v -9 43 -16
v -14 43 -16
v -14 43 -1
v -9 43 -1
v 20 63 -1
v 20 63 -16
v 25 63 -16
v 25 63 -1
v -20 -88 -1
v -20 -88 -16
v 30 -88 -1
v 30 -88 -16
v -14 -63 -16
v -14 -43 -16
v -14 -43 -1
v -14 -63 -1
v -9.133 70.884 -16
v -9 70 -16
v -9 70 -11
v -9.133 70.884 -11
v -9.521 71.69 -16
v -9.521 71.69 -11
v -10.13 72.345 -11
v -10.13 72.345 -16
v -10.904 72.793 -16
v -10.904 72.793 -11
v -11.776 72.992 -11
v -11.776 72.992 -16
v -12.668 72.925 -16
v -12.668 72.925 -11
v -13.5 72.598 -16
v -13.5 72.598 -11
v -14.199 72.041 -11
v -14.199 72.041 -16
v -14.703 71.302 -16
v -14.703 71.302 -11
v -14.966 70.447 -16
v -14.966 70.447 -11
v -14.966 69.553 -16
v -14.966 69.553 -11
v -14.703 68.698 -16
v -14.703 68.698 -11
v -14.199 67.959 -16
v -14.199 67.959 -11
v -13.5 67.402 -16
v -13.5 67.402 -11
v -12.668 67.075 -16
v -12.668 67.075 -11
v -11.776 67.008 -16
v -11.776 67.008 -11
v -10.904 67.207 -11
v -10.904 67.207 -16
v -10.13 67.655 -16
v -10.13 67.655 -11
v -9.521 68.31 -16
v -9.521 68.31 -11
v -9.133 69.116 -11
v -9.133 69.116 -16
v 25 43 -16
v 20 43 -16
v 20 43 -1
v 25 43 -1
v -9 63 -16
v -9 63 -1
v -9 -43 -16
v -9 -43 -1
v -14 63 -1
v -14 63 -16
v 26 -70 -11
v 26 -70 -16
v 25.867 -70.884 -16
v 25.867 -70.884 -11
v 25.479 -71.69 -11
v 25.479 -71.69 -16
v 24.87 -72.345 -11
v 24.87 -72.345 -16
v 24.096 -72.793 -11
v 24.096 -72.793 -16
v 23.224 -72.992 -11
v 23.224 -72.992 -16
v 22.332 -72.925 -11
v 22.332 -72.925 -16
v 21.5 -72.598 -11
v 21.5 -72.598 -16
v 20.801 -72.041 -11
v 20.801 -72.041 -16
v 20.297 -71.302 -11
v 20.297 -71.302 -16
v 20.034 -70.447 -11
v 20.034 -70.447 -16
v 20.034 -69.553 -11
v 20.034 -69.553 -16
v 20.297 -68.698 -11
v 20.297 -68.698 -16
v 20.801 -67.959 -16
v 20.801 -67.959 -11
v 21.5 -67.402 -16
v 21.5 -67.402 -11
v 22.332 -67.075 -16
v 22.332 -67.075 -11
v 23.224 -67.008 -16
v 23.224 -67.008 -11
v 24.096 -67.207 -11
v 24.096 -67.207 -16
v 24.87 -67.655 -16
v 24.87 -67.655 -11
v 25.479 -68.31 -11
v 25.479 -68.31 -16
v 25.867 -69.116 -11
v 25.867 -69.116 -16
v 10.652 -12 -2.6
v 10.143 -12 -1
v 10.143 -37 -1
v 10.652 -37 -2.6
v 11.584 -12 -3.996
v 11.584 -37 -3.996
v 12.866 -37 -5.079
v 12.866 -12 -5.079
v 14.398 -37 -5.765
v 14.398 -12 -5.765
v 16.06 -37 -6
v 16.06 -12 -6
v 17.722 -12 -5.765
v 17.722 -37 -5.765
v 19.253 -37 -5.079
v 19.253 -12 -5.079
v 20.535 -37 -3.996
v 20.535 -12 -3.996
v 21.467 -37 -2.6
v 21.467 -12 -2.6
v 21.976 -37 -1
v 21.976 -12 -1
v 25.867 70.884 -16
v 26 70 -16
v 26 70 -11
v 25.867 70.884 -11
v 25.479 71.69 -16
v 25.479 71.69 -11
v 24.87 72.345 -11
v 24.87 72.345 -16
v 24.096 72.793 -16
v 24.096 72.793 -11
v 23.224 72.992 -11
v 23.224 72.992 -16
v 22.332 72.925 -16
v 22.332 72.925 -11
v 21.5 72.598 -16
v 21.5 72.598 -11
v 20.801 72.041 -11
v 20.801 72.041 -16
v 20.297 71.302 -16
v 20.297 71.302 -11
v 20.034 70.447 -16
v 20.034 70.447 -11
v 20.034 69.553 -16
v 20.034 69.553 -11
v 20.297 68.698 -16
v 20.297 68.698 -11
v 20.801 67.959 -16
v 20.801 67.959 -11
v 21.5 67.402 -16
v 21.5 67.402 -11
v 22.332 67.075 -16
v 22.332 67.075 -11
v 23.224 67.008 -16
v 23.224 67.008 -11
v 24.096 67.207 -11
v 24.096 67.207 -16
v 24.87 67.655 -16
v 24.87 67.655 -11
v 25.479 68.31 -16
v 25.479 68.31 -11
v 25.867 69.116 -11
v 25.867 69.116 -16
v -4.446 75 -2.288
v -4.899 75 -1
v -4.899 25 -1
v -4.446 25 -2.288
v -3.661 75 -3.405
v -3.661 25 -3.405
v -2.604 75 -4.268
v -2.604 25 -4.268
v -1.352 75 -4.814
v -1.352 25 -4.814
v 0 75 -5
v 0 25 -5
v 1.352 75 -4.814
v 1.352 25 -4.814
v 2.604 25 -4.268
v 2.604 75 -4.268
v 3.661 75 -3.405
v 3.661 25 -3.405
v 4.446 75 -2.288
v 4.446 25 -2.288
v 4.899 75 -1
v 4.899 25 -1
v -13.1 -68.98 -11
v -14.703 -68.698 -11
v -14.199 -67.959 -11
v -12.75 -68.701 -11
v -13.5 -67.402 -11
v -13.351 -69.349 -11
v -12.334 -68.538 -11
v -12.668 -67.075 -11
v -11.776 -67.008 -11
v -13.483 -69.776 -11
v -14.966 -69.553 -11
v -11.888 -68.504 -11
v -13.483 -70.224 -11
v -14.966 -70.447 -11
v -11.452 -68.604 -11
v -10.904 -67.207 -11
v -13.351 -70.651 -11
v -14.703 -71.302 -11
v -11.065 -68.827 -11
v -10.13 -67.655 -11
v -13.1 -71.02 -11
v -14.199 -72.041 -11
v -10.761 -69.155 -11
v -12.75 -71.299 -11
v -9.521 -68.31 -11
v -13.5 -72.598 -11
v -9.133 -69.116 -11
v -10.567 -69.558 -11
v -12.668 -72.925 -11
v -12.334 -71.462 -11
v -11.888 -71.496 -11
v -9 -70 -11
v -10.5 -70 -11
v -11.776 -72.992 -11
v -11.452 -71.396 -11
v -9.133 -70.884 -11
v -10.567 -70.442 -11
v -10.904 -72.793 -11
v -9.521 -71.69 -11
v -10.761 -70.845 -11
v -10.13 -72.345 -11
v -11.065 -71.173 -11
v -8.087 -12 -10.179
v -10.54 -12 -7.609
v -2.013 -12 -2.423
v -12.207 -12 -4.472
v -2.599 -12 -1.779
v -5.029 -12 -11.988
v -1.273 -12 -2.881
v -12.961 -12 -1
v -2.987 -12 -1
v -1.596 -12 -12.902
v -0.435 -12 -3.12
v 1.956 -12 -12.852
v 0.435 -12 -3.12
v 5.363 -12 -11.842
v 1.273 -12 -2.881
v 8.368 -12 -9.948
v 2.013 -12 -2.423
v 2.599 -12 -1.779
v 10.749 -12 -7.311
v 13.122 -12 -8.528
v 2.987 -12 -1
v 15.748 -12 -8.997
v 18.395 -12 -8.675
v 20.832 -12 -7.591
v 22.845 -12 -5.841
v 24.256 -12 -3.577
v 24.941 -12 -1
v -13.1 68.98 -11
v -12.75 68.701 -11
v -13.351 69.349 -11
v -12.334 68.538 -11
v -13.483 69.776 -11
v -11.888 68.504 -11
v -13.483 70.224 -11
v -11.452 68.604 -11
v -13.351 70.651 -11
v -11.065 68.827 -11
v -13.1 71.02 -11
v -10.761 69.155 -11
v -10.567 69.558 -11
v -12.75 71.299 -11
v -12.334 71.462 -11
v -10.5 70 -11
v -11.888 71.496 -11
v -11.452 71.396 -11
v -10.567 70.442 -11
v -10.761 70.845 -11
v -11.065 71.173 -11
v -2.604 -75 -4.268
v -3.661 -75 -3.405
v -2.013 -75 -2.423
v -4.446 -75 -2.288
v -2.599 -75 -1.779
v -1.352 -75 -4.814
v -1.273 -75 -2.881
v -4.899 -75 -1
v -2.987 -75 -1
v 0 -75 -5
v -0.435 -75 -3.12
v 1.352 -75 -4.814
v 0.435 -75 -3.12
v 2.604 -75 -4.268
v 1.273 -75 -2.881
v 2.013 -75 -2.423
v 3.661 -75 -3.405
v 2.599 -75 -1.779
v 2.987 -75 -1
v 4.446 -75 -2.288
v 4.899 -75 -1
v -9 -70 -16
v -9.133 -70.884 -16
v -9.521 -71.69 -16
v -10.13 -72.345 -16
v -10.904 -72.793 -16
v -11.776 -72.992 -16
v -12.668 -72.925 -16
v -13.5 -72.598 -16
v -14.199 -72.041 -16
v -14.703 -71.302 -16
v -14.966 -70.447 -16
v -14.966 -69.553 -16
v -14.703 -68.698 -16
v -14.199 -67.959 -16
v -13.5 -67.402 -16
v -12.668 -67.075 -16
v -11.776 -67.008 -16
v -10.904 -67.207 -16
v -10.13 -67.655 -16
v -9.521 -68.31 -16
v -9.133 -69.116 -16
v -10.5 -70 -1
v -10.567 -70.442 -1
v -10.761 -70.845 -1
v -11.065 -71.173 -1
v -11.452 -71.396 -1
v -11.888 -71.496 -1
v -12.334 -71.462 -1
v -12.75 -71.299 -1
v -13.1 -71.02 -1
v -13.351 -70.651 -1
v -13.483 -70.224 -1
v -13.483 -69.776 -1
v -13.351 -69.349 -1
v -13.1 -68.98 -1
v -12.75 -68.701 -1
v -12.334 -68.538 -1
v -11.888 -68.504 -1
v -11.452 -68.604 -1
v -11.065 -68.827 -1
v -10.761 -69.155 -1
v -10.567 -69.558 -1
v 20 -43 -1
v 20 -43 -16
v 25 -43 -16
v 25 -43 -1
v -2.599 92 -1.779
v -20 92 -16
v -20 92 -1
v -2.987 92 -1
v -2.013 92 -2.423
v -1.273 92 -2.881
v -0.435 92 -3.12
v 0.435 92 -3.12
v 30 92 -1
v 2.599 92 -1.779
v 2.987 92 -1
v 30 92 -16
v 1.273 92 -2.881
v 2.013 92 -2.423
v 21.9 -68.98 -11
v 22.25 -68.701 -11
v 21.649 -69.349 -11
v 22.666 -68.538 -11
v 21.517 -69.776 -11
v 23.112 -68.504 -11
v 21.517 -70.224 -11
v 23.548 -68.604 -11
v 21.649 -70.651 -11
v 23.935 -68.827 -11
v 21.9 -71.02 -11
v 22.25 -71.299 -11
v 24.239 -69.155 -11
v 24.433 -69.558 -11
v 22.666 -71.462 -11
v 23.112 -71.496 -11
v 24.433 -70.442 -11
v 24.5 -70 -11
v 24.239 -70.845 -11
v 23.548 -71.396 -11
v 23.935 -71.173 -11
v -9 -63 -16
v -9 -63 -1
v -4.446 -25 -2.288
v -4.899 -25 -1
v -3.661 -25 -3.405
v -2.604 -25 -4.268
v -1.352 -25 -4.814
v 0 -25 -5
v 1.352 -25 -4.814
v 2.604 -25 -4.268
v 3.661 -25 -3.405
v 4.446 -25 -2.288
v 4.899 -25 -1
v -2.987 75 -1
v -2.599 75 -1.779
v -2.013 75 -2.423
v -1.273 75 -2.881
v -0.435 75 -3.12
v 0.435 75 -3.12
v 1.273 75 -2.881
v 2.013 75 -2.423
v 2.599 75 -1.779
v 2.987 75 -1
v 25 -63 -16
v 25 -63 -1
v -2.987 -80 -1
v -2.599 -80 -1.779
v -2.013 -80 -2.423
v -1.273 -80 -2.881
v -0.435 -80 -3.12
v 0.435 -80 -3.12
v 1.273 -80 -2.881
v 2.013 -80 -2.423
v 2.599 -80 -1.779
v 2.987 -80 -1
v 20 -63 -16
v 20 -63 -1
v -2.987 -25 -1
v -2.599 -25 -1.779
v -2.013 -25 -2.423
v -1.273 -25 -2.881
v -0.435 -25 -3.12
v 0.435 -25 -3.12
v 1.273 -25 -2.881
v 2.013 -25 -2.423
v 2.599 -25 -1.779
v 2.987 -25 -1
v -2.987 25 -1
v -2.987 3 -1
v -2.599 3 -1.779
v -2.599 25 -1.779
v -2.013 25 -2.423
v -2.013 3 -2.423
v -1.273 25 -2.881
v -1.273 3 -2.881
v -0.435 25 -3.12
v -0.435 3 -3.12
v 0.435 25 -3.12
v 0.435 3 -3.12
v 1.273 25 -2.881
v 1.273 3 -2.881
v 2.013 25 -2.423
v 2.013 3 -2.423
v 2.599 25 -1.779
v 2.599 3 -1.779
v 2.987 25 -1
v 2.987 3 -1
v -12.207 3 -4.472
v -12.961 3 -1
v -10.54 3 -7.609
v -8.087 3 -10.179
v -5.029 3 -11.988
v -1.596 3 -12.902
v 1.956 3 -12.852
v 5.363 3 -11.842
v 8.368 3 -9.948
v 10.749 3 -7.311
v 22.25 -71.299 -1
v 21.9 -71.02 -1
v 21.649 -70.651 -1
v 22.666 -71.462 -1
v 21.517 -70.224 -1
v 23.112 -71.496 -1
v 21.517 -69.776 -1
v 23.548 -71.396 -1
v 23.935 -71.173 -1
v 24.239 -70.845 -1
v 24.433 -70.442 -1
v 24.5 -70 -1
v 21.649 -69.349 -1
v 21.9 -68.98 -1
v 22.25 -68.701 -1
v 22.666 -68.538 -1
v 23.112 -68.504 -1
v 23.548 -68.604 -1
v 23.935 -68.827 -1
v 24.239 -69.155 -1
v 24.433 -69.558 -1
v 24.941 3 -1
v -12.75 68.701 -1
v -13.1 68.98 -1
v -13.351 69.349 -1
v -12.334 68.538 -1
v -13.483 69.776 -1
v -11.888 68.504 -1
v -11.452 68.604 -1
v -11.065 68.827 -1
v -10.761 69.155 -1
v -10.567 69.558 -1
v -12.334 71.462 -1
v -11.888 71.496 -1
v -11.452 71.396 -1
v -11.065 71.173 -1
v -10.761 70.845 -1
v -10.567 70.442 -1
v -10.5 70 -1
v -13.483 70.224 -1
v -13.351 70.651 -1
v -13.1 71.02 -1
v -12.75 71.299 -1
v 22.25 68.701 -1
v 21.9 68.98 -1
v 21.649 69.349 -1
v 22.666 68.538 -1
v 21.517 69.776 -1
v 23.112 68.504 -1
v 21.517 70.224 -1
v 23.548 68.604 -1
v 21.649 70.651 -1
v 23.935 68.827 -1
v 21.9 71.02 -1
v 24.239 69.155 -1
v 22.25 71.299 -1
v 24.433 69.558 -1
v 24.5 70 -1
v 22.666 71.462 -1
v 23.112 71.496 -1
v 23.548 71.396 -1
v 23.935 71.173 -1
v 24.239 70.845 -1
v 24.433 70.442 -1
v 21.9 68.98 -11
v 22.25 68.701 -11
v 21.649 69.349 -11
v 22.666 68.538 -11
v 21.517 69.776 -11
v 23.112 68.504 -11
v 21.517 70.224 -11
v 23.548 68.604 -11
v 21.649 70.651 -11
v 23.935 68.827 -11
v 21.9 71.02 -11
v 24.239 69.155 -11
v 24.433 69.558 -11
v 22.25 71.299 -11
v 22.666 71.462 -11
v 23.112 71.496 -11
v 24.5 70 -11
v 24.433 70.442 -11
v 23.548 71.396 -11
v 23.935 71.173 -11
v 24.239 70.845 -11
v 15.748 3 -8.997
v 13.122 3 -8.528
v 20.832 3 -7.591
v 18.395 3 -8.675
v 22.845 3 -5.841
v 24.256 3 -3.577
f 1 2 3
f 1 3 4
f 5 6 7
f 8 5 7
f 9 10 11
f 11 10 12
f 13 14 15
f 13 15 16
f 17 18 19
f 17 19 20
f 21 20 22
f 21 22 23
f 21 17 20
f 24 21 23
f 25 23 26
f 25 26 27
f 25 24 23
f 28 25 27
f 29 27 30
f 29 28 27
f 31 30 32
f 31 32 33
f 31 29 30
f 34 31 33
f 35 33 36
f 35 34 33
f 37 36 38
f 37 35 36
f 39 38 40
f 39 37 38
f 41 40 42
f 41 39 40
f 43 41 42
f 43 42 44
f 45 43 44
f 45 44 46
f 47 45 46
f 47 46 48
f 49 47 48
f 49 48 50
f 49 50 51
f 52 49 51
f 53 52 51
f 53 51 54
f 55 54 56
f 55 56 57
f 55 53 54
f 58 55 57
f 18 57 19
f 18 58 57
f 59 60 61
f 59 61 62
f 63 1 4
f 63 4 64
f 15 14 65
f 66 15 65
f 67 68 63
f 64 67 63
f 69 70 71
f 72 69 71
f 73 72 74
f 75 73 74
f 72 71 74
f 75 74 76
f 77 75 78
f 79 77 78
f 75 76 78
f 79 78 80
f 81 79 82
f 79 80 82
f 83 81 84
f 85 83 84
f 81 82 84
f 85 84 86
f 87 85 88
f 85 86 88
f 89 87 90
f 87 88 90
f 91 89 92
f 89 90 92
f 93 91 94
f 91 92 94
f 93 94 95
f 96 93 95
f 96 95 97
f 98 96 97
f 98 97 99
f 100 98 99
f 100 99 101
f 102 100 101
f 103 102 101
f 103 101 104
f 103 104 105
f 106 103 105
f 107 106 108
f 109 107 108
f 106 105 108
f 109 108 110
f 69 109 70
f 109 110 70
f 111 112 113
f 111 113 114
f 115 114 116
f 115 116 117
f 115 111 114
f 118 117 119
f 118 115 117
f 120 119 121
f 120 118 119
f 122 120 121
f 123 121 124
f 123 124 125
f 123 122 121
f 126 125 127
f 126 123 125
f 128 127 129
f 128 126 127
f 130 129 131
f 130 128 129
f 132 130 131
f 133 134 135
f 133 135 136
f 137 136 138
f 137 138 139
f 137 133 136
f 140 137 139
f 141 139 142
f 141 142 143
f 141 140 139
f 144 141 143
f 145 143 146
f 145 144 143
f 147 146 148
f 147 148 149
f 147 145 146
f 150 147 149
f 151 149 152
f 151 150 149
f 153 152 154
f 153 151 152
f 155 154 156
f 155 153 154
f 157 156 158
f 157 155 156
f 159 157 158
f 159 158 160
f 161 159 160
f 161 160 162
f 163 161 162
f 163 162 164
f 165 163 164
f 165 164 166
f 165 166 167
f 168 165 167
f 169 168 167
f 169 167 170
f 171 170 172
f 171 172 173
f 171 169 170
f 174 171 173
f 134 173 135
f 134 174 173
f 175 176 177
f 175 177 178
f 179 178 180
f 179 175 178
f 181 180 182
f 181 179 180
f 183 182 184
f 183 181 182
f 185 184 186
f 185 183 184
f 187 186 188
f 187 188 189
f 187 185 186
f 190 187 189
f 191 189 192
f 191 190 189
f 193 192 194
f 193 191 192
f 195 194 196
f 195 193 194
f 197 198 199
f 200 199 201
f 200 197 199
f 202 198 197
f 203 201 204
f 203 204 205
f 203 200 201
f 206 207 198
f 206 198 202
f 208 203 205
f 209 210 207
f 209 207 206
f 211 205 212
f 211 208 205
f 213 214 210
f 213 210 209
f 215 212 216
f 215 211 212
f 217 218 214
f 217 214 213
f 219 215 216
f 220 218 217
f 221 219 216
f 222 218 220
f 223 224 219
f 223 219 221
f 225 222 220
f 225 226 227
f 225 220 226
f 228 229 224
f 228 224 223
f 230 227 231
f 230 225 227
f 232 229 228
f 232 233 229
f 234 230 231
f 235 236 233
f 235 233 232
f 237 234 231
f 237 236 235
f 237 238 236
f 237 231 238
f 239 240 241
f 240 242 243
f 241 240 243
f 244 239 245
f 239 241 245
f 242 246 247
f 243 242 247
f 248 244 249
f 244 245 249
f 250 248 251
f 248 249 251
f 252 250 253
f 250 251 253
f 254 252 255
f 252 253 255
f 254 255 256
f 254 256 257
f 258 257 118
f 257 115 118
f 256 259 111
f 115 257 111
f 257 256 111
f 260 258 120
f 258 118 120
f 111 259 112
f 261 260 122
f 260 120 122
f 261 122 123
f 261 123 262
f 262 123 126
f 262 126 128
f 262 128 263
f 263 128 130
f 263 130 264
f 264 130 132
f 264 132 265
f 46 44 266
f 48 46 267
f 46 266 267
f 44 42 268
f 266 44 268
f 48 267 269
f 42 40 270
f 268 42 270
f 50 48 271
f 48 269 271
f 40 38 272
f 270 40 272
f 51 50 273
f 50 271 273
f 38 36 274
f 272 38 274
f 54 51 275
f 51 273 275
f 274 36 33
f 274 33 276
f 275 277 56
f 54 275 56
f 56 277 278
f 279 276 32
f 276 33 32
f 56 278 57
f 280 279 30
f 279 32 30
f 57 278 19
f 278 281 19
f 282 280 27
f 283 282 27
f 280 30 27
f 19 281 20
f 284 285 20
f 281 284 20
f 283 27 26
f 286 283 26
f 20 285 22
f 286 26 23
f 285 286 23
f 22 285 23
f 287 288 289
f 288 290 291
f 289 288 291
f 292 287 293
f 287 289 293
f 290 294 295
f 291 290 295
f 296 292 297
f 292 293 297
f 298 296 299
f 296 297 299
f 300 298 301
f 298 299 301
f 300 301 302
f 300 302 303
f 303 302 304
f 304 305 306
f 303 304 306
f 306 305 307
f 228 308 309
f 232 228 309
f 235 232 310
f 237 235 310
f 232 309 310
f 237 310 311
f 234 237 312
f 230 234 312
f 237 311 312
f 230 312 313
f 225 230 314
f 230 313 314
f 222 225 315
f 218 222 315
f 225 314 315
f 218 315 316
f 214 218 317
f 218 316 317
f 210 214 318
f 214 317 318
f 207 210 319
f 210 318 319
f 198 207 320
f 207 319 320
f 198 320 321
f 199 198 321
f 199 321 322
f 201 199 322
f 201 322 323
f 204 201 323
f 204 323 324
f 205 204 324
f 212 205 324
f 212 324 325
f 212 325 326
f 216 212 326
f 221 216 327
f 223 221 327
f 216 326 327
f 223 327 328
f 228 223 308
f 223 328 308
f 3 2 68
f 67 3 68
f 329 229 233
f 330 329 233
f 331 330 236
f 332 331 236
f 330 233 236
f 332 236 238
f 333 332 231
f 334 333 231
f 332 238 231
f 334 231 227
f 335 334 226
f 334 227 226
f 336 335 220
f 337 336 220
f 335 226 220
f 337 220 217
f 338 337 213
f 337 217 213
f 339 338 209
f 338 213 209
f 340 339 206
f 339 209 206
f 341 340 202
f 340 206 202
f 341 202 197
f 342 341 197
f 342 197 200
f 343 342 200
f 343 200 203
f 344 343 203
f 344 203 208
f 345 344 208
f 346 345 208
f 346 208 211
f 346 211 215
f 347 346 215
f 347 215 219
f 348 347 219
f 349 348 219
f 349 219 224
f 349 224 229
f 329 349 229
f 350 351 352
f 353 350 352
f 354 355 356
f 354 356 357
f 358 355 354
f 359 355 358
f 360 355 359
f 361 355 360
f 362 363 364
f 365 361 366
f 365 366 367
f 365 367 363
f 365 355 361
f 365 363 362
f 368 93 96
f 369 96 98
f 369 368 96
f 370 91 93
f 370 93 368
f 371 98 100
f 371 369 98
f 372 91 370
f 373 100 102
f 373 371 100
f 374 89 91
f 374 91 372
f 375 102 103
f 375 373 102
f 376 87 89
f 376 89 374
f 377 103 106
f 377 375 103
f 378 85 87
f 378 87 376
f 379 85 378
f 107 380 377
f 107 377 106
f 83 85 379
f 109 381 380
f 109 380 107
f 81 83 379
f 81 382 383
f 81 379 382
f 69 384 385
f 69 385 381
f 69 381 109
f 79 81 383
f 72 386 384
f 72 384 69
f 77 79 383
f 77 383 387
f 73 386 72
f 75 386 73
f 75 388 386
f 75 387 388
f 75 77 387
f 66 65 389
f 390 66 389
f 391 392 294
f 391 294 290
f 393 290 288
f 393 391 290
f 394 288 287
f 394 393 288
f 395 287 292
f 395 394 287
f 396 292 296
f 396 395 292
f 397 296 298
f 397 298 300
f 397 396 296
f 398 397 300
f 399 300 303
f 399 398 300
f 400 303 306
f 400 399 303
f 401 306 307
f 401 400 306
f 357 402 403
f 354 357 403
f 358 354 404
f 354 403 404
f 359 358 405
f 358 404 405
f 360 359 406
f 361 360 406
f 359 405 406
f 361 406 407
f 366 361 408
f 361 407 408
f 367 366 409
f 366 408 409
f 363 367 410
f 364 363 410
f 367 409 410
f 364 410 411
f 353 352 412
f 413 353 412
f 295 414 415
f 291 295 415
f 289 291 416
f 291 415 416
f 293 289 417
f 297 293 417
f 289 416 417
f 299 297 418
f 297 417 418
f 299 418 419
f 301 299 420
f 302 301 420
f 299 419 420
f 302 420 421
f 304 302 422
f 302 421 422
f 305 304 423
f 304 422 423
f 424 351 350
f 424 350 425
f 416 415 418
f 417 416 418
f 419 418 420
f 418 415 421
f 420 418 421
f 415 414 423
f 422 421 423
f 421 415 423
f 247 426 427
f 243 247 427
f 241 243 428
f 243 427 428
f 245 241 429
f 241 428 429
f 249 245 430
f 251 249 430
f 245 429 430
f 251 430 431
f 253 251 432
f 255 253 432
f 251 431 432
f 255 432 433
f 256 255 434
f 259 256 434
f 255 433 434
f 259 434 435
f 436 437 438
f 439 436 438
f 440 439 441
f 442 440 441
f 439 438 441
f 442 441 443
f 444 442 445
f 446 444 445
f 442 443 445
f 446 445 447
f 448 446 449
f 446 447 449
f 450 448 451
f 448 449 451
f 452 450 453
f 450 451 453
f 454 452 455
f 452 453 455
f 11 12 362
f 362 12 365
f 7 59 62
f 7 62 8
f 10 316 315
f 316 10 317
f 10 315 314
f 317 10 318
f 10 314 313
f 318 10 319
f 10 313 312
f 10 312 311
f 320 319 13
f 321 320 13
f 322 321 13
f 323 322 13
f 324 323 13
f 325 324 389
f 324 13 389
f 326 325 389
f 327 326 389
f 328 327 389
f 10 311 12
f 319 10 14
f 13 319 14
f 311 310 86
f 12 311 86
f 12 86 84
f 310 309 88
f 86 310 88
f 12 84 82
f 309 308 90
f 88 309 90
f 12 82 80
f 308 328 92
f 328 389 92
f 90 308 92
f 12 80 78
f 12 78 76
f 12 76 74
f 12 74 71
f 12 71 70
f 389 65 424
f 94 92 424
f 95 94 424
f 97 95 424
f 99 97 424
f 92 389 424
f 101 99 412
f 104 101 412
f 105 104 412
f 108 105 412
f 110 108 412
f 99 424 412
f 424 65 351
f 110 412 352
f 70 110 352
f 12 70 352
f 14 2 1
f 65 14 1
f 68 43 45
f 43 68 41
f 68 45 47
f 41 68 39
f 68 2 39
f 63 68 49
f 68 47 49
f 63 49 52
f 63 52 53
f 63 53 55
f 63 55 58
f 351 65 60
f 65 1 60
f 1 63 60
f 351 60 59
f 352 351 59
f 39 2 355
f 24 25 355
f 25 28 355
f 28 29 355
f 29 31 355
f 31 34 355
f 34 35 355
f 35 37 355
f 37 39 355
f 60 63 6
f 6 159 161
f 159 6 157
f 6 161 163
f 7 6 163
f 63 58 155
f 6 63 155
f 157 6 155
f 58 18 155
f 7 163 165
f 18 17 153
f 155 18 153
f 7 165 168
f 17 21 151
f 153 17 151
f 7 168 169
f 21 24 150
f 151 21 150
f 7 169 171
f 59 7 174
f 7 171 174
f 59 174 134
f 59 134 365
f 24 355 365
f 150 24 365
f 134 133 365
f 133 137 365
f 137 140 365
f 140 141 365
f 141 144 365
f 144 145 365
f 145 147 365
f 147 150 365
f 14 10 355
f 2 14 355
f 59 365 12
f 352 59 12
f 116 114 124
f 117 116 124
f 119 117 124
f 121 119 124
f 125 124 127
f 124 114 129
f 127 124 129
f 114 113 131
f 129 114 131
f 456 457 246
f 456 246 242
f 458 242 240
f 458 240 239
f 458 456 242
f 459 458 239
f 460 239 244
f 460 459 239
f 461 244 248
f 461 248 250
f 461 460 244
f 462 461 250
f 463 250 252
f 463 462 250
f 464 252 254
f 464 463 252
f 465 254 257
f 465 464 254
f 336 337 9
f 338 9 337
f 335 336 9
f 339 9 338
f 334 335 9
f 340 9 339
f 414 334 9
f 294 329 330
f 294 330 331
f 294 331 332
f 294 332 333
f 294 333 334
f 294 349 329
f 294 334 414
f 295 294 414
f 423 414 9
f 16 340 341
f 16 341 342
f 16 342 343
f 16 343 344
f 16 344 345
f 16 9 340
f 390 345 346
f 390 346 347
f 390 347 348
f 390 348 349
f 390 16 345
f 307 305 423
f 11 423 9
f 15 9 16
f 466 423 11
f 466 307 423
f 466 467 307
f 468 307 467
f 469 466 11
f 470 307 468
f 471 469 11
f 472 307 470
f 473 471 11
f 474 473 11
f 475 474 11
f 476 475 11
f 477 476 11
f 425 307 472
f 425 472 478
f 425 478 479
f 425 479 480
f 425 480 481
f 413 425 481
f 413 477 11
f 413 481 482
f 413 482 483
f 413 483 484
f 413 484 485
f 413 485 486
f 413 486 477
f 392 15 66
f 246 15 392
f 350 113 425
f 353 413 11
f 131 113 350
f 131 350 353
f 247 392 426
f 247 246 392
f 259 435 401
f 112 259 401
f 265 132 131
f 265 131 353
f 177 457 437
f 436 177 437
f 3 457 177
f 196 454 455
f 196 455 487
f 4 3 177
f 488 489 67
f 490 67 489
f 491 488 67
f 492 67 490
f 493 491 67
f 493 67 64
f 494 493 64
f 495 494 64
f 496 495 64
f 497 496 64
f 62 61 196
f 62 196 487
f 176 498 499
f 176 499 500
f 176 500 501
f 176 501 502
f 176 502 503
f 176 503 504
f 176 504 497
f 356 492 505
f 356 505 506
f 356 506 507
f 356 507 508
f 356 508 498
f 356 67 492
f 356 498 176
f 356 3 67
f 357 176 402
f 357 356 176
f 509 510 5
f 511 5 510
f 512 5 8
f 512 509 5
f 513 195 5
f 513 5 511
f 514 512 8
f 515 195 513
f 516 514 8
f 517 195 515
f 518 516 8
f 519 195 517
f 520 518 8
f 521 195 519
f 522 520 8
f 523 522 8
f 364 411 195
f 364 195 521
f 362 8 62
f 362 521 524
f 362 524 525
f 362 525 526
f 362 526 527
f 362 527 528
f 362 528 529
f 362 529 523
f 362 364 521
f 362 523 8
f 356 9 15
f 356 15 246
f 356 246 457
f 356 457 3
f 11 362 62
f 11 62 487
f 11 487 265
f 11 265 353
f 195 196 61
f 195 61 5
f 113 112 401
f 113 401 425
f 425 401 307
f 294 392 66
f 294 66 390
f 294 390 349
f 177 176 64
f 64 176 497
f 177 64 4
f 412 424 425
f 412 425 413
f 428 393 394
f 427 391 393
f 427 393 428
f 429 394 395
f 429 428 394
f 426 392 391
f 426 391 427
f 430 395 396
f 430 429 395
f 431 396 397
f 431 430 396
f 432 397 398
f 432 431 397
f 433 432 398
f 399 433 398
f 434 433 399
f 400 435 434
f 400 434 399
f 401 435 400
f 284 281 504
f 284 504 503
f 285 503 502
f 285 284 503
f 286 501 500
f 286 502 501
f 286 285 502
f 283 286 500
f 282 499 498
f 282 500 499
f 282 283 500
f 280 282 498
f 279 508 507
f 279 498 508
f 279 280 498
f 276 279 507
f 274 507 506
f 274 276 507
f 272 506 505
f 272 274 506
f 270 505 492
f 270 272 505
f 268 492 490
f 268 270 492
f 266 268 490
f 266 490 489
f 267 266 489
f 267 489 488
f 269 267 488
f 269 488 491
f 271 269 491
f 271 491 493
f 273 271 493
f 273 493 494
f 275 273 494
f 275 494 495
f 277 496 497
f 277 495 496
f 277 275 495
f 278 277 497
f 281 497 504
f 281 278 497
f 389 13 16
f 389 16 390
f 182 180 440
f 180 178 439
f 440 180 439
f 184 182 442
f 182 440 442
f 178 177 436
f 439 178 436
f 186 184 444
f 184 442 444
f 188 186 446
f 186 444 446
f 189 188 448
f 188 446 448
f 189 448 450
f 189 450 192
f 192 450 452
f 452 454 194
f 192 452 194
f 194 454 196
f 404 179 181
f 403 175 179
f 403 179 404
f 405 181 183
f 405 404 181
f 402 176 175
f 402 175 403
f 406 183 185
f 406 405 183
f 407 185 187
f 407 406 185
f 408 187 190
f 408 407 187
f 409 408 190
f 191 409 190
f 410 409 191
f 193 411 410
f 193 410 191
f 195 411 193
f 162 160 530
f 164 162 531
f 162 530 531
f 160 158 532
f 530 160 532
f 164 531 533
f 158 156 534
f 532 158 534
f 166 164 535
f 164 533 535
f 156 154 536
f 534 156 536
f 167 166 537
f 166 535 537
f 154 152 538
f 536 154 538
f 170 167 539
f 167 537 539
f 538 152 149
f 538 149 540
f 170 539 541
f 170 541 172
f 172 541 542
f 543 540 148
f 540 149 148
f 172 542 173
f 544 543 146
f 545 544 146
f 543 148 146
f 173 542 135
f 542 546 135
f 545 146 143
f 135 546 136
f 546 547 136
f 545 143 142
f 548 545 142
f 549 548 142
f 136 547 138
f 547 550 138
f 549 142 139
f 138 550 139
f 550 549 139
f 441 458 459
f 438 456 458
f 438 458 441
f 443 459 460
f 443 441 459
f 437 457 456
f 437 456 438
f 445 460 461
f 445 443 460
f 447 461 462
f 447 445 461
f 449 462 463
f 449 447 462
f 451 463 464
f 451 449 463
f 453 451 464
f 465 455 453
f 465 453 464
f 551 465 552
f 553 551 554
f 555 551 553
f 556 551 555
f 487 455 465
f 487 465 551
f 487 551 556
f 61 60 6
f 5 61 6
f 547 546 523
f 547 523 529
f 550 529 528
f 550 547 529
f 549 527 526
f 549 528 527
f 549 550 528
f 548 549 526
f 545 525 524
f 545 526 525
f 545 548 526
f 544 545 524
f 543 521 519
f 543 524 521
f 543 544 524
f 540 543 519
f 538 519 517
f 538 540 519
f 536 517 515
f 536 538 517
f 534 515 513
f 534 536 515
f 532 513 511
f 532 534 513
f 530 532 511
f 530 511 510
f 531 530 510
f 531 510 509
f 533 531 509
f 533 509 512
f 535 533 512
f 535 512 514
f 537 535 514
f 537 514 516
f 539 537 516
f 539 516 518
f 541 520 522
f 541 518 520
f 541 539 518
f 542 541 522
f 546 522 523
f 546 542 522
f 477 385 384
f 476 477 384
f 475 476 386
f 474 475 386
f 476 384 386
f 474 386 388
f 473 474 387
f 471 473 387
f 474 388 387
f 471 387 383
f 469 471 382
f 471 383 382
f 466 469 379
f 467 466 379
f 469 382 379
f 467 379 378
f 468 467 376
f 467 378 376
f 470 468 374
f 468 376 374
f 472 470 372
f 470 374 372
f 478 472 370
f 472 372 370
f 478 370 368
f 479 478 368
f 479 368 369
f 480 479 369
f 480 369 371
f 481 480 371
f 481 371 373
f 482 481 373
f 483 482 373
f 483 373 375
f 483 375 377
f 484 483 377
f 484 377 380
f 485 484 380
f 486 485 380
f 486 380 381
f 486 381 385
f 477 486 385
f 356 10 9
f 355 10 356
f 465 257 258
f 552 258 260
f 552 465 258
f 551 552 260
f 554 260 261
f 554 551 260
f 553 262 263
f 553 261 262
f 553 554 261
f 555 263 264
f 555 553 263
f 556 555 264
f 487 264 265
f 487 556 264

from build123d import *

# Parameters (mm, degrees)
SKETCH006_R     = 3.15
PAD002_DEPTH    = 190
SKETCH011_R     = 5
PAD007_DEPTH    = 50
SKETCH010_R     = 5
PAD006_DEPTH    = 50
SKETCH008_R     = 13
PAD004_DEPTH    = 15
SKETCH009_R     = 9
PAD005_DEPTH    = 15
SKETCH013_R     = 6
PAD008_DEPTH    = 26
BOX001_W        = 50
BOX001_H        = 180
BOX001_DEPTH    = 15
SKETCH015_R     = 1.5
POCKET001_DEPTH = 389.834296
SKETCH016_R     = 1.5
POCKET002_DEPTH = 389.834296
SKETCH017_R     = 3
POCKET003_DEPTH = 5
SKETCH018_R     = 3
POCKET004_DEPTH = 5
SKETCH022_W     = 5
SKETCH022_H     = 20
POCKET008_DEPTH = 389.834296
SKETCH023_W     = 5
SKETCH023_H     = 20
POCKET009_DEPTH = 389.834296


with BuildPart() as pad002:
    # Sketch006 → Pad002 (new body)
    with BuildSketch(Plane.XZ.offset(80)):
        Circle(SKETCH006_R)
    extrude(amount=-PAD002_DEPTH)


with BuildPart() as pad007:
    # Sketch011 → Pad007 (new body)
    with BuildSketch(Plane.XZ.offset(-75)):
        Circle(SKETCH011_R)
    extrude(amount=PAD007_DEPTH)


with BuildPart() as scassi_perno:
    # Sketch010 → Pad006 (new body)
    with BuildSketch(Plane.XZ.offset(25)):
        Circle(SKETCH010_R)
    extrude(amount=PAD006_DEPTH)

    # Fusion002: union Pad007
    add(pad007.part)


with BuildPart() as scasso_ruota_dentata:
    # Sketch008 → Pad004 (new body)
    with BuildSketch(Plane.XZ.offset(-3)):
        Circle(SKETCH008_R)
    extrude(amount=PAD004_DEPTH)


with BuildPart() as scassi_ruote_dentate:
    # Sketch009 → Pad005 (new body)
    with BuildSketch(Plane.XZ.offset(-3)):
        with Locations((15.997087, 9e-06)):
            Circle(SKETCH009_R)
    extrude(amount=PAD005_DEPTH)

    # Fusion001: union scasso_ruota_dentata
    add(scasso_ruota_dentata.part)


with BuildPart() as fusion:
    # Sketch013 → Pad008 (new body)
    with BuildSketch(Plane.XZ.offset(11)):
        with Locations((16.059561, 9e-06)):
            Circle(SKETCH013_R)
    extrude(amount=PAD008_DEPTH)

    # Fusion005: union scassi_perno, scassi_ruote_dentate
    add(scassi_perno.part)
    add(scassi_ruote_dentate.part)

    # Fusion: union Pad002
    add(pad002.part)


with BuildPart() as tappo_con_4_scassi:
    # Box001 → Box001 (new body)
    with BuildSketch(Plane(origin=(-20, -88, -16), x_dir=(1, 0, 0), z_dir=(0, 0, 1))):
        with Locations((25, 90)):
            Rectangle(BOX001_W, BOX001_H)
    extrude(amount=BOX001_DEPTH)

    # Cut001: cut Fusion
    add(fusion.part, mode=Mode.SUBTRACT)

    # Sketch015 → Pocket001 (cut, through all)
    with BuildSketch(Plane(origin=(0, 0, -16), x_dir=(1, 0, 0), z_dir=(0, 0, -1))):
        with Locations((23, 70)):
            Circle(SKETCH015_R)
    pocket001 = extrude(amount=-POCKET001_DEPTH, mode=Mode.SUBTRACT)

    # Mirrored: Pocket001 across Sketch015 H_Axis
    add(pocket001.mirror(Plane(origin=(0, 0, -16), x_dir=(0, 0, -1), z_dir=(0, -1, 0))), mode=Mode.SUBTRACT)

    # Sketch016 → Pocket002 (cut, through all)
    with BuildSketch(Plane(origin=(0, 0, -16), x_dir=(1, 0, 0), z_dir=(0, 0, -1))):
        with Locations((-12, 70)):
            Circle(SKETCH016_R)
    pocket002 = extrude(amount=-POCKET002_DEPTH, mode=Mode.SUBTRACT)

    # Mirrored001: Pocket002 across Sketch016 H_Axis
    add(pocket002.mirror(Plane(origin=(0, 0, -16), x_dir=(0, 0, -1), z_dir=(0, -1, 0))), mode=Mode.SUBTRACT)

    # Sketch017 → Pocket003 (cut)
    with BuildSketch(Plane(origin=(0, 0, -16), x_dir=(1, 0, 0), z_dir=(0, 0, -1))):
        with Locations((23, 70)):
            Circle(SKETCH017_R)
    pocket003 = extrude(amount=-POCKET003_DEPTH, mode=Mode.SUBTRACT)

    # Mirrored002: Pocket003 across Sketch017 H_Axis
    add(pocket003.mirror(Plane(origin=(0, 0, -16), x_dir=(0, 0, -1), z_dir=(0, -1, 0))), mode=Mode.SUBTRACT)

    # Sketch018 → Pocket004 (cut)
    with BuildSketch(Plane(origin=(0, 0, -16), x_dir=(1, 0, 0), z_dir=(0, 0, -1))):
        with Locations((-12, 70)):
            Circle(SKETCH018_R)
    pocket004 = extrude(amount=-POCKET004_DEPTH, mode=Mode.SUBTRACT)

    # Mirrored003: Pocket004 across Sketch018 H_Axis
    add(pocket004.mirror(Plane(origin=(0, 0, -16), x_dir=(0, 0, -1), z_dir=(0, -1, 0))), mode=Mode.SUBTRACT)

    # Sketch022 → Pocket008 (cut, through all)
    with BuildSketch(Plane(origin=(0, 0, -16), x_dir=(1, 0, 0), z_dir=(0, 0, -1))):
        with Locations((22.5, 53)):
            Rectangle(SKETCH022_W, SKETCH022_H)
    pocket008 = extrude(amount=-POCKET008_DEPTH, mode=Mode.SUBTRACT)

    # Mirrored006: Pocket008 across Sketch022 H_Axis
    add(pocket008.mirror(Plane(origin=(0, 0, -16), x_dir=(0, 0, -1), z_dir=(0, -1, 0))), mode=Mode.SUBTRACT)

    # Sketch023 → Pocket009 (cut, through all)
    with BuildSketch(Plane(origin=(0, 0, -16), x_dir=(1, 0, 0), z_dir=(0, 0, -1))):
        with Locations((-11.5, 53)):
            Rectangle(SKETCH023_W, SKETCH023_H)
    pocket009 = extrude(amount=-POCKET009_DEPTH, mode=Mode.SUBTRACT)

    # Mirrored007: Pocket009 across Sketch023 H_Axis
    add(pocket009.mirror(Plane(origin=(0, 0, -16), x_dir=(0, 0, -1), z_dir=(0, -1, 0))), mode=Mode.SUBTRACT)


solid = tappo_con_4_scassi.part
